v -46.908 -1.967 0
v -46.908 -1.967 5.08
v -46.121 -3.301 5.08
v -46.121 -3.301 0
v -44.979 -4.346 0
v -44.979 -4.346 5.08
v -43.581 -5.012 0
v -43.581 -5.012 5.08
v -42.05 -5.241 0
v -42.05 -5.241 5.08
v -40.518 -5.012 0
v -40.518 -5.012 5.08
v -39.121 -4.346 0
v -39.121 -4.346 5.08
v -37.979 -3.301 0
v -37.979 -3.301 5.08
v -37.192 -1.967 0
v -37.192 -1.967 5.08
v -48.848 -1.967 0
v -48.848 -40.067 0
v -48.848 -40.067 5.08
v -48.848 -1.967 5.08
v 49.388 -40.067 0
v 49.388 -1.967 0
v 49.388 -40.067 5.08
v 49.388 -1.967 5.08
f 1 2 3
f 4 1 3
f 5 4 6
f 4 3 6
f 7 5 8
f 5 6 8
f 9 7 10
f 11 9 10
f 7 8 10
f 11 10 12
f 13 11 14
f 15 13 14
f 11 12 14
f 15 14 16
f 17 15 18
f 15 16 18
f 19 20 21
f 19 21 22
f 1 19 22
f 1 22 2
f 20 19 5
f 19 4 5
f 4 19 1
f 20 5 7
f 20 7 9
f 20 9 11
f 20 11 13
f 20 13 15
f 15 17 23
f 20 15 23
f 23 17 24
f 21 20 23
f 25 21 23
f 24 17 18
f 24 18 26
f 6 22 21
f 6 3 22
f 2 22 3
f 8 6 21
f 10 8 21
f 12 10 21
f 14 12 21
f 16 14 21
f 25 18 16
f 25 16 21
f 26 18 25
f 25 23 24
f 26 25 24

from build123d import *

# Parameters (mm, degrees)
F0_W     = 98.2365459204
F0_H     = 38.1
F1_DEPTH = 5.08
F3_DEPTH = 25.4


# Not quite as in the source:
# - a feature names something its author has since deleted; it is built from what else it names


with BuildPart() as f1:
    # F0 (on Top) → F1 (new body)
    with BuildSketch(Plane.XY):
        with Locations((0.2698786557, -21.017140013)):
            Rectangle(F0_W, F0_H)
    extrude(amount=F1_DEPTH)

    # F2 (on face) → F3 (cut)
    with BuildSketch(Plane.XY.offset(5.08)):
        with BuildLine():
            Line((-37.191967051, -1.967140013), (-46.9076386285, -1.967140013))
            ThreePointArc((-46.9076386285, -1.967140013), (-42.0498028398, -5.2410121524), (-37.191967051, -1.967140013))
        make_face()
        with BuildLine():
            ThreePointArc((-37.191967051, -1.967140013), (-36.9054766067, -1.0020558812), (-36.8087906874, 0))
            ThreePointArc((-36.8087906874, 0), (-43.051858721, 5.1443262331), (-46.9076386285, -1.967140013))
            Line((-46.9076386285, -1.967140013), (-37.191967051, -1.967140013))
        make_face()
    extrude(amount=-F3_DEPTH, mode=Mode.SUBTRACT)


solid = f1.part
